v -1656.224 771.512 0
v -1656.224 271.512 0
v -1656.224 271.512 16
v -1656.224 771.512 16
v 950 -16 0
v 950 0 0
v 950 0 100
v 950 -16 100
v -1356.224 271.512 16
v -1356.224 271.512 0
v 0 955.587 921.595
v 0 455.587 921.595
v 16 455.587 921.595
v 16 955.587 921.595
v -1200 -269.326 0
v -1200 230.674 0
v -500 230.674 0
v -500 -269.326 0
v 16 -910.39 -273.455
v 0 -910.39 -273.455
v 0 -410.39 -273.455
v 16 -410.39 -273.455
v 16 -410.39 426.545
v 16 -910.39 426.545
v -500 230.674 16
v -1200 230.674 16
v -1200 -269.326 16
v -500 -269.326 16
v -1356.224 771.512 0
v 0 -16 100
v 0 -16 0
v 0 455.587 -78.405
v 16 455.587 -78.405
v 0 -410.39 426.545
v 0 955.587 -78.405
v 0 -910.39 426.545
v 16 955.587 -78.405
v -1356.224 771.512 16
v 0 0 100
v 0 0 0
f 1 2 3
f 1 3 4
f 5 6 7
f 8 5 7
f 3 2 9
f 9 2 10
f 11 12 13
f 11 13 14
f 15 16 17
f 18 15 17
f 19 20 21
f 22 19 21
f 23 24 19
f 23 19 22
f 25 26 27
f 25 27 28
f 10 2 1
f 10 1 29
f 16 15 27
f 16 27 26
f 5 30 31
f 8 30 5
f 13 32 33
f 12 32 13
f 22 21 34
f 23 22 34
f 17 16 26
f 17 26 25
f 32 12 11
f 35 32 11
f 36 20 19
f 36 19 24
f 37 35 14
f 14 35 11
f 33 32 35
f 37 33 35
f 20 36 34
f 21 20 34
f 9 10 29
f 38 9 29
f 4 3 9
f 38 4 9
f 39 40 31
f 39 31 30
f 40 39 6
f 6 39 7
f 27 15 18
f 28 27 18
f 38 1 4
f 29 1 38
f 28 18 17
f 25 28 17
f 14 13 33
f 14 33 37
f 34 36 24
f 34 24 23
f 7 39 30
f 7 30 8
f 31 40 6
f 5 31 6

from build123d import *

# Parameters (mm, degrees)
F0_W     = 950
F0_H     = 100
F1_DEPTH = 16
F2_W     = 500
F2_H     = 700
F3_DEPTH = 16
F4_W     = 500
F4_H     = 1000
F5_DEPTH = 16
F6_W     = 700
F6_H     = 500
F7_DEPTH = 16
F8_W     = 300
F8_H     = 500
F9_DEPTH = 16


with BuildPart() as f1:
    # F0 (on Front) → F1 (new body)
    with BuildSketch(Plane.XZ):
        with Locations((475, 50)):
            Rectangle(F0_W, F0_H)
    extrude(amount=F1_DEPTH)


with BuildPart() as f3:
    # F2 (on Right) → F3 (new body)
    with BuildSketch(Plane.YZ):
        with Locations((-660.389677, 76.544831)):
            Rectangle(F2_W, F2_H)
    extrude(amount=F3_DEPTH)


with BuildPart() as f5:
    # F4 (on Right) → F5 (new body)
    with BuildSketch(Plane.YZ):
        with Locations((705.586895, 421.594957)):
            Rectangle(F4_W, F4_H)
    extrude(amount=F5_DEPTH)


with BuildPart() as f7:
    # F6 (on Top) → F7 (new body)
    with BuildSketch(Plane.XY):
        with Locations((-850, -19.326312)):
            Rectangle(F6_W, F6_H)
    extrude(amount=F7_DEPTH)


with BuildPart() as f9:
    # F8 (on Top) → F9 (new body)
    with BuildSketch(Plane.XY):
        with Locations((-1506.223583, 521.511942)):
            Rectangle(F8_W, F8_H)
    extrude(amount=F9_DEPTH)


solid = Compound([f1.part, f3.part, f5.part, f7.part, f9.part])
